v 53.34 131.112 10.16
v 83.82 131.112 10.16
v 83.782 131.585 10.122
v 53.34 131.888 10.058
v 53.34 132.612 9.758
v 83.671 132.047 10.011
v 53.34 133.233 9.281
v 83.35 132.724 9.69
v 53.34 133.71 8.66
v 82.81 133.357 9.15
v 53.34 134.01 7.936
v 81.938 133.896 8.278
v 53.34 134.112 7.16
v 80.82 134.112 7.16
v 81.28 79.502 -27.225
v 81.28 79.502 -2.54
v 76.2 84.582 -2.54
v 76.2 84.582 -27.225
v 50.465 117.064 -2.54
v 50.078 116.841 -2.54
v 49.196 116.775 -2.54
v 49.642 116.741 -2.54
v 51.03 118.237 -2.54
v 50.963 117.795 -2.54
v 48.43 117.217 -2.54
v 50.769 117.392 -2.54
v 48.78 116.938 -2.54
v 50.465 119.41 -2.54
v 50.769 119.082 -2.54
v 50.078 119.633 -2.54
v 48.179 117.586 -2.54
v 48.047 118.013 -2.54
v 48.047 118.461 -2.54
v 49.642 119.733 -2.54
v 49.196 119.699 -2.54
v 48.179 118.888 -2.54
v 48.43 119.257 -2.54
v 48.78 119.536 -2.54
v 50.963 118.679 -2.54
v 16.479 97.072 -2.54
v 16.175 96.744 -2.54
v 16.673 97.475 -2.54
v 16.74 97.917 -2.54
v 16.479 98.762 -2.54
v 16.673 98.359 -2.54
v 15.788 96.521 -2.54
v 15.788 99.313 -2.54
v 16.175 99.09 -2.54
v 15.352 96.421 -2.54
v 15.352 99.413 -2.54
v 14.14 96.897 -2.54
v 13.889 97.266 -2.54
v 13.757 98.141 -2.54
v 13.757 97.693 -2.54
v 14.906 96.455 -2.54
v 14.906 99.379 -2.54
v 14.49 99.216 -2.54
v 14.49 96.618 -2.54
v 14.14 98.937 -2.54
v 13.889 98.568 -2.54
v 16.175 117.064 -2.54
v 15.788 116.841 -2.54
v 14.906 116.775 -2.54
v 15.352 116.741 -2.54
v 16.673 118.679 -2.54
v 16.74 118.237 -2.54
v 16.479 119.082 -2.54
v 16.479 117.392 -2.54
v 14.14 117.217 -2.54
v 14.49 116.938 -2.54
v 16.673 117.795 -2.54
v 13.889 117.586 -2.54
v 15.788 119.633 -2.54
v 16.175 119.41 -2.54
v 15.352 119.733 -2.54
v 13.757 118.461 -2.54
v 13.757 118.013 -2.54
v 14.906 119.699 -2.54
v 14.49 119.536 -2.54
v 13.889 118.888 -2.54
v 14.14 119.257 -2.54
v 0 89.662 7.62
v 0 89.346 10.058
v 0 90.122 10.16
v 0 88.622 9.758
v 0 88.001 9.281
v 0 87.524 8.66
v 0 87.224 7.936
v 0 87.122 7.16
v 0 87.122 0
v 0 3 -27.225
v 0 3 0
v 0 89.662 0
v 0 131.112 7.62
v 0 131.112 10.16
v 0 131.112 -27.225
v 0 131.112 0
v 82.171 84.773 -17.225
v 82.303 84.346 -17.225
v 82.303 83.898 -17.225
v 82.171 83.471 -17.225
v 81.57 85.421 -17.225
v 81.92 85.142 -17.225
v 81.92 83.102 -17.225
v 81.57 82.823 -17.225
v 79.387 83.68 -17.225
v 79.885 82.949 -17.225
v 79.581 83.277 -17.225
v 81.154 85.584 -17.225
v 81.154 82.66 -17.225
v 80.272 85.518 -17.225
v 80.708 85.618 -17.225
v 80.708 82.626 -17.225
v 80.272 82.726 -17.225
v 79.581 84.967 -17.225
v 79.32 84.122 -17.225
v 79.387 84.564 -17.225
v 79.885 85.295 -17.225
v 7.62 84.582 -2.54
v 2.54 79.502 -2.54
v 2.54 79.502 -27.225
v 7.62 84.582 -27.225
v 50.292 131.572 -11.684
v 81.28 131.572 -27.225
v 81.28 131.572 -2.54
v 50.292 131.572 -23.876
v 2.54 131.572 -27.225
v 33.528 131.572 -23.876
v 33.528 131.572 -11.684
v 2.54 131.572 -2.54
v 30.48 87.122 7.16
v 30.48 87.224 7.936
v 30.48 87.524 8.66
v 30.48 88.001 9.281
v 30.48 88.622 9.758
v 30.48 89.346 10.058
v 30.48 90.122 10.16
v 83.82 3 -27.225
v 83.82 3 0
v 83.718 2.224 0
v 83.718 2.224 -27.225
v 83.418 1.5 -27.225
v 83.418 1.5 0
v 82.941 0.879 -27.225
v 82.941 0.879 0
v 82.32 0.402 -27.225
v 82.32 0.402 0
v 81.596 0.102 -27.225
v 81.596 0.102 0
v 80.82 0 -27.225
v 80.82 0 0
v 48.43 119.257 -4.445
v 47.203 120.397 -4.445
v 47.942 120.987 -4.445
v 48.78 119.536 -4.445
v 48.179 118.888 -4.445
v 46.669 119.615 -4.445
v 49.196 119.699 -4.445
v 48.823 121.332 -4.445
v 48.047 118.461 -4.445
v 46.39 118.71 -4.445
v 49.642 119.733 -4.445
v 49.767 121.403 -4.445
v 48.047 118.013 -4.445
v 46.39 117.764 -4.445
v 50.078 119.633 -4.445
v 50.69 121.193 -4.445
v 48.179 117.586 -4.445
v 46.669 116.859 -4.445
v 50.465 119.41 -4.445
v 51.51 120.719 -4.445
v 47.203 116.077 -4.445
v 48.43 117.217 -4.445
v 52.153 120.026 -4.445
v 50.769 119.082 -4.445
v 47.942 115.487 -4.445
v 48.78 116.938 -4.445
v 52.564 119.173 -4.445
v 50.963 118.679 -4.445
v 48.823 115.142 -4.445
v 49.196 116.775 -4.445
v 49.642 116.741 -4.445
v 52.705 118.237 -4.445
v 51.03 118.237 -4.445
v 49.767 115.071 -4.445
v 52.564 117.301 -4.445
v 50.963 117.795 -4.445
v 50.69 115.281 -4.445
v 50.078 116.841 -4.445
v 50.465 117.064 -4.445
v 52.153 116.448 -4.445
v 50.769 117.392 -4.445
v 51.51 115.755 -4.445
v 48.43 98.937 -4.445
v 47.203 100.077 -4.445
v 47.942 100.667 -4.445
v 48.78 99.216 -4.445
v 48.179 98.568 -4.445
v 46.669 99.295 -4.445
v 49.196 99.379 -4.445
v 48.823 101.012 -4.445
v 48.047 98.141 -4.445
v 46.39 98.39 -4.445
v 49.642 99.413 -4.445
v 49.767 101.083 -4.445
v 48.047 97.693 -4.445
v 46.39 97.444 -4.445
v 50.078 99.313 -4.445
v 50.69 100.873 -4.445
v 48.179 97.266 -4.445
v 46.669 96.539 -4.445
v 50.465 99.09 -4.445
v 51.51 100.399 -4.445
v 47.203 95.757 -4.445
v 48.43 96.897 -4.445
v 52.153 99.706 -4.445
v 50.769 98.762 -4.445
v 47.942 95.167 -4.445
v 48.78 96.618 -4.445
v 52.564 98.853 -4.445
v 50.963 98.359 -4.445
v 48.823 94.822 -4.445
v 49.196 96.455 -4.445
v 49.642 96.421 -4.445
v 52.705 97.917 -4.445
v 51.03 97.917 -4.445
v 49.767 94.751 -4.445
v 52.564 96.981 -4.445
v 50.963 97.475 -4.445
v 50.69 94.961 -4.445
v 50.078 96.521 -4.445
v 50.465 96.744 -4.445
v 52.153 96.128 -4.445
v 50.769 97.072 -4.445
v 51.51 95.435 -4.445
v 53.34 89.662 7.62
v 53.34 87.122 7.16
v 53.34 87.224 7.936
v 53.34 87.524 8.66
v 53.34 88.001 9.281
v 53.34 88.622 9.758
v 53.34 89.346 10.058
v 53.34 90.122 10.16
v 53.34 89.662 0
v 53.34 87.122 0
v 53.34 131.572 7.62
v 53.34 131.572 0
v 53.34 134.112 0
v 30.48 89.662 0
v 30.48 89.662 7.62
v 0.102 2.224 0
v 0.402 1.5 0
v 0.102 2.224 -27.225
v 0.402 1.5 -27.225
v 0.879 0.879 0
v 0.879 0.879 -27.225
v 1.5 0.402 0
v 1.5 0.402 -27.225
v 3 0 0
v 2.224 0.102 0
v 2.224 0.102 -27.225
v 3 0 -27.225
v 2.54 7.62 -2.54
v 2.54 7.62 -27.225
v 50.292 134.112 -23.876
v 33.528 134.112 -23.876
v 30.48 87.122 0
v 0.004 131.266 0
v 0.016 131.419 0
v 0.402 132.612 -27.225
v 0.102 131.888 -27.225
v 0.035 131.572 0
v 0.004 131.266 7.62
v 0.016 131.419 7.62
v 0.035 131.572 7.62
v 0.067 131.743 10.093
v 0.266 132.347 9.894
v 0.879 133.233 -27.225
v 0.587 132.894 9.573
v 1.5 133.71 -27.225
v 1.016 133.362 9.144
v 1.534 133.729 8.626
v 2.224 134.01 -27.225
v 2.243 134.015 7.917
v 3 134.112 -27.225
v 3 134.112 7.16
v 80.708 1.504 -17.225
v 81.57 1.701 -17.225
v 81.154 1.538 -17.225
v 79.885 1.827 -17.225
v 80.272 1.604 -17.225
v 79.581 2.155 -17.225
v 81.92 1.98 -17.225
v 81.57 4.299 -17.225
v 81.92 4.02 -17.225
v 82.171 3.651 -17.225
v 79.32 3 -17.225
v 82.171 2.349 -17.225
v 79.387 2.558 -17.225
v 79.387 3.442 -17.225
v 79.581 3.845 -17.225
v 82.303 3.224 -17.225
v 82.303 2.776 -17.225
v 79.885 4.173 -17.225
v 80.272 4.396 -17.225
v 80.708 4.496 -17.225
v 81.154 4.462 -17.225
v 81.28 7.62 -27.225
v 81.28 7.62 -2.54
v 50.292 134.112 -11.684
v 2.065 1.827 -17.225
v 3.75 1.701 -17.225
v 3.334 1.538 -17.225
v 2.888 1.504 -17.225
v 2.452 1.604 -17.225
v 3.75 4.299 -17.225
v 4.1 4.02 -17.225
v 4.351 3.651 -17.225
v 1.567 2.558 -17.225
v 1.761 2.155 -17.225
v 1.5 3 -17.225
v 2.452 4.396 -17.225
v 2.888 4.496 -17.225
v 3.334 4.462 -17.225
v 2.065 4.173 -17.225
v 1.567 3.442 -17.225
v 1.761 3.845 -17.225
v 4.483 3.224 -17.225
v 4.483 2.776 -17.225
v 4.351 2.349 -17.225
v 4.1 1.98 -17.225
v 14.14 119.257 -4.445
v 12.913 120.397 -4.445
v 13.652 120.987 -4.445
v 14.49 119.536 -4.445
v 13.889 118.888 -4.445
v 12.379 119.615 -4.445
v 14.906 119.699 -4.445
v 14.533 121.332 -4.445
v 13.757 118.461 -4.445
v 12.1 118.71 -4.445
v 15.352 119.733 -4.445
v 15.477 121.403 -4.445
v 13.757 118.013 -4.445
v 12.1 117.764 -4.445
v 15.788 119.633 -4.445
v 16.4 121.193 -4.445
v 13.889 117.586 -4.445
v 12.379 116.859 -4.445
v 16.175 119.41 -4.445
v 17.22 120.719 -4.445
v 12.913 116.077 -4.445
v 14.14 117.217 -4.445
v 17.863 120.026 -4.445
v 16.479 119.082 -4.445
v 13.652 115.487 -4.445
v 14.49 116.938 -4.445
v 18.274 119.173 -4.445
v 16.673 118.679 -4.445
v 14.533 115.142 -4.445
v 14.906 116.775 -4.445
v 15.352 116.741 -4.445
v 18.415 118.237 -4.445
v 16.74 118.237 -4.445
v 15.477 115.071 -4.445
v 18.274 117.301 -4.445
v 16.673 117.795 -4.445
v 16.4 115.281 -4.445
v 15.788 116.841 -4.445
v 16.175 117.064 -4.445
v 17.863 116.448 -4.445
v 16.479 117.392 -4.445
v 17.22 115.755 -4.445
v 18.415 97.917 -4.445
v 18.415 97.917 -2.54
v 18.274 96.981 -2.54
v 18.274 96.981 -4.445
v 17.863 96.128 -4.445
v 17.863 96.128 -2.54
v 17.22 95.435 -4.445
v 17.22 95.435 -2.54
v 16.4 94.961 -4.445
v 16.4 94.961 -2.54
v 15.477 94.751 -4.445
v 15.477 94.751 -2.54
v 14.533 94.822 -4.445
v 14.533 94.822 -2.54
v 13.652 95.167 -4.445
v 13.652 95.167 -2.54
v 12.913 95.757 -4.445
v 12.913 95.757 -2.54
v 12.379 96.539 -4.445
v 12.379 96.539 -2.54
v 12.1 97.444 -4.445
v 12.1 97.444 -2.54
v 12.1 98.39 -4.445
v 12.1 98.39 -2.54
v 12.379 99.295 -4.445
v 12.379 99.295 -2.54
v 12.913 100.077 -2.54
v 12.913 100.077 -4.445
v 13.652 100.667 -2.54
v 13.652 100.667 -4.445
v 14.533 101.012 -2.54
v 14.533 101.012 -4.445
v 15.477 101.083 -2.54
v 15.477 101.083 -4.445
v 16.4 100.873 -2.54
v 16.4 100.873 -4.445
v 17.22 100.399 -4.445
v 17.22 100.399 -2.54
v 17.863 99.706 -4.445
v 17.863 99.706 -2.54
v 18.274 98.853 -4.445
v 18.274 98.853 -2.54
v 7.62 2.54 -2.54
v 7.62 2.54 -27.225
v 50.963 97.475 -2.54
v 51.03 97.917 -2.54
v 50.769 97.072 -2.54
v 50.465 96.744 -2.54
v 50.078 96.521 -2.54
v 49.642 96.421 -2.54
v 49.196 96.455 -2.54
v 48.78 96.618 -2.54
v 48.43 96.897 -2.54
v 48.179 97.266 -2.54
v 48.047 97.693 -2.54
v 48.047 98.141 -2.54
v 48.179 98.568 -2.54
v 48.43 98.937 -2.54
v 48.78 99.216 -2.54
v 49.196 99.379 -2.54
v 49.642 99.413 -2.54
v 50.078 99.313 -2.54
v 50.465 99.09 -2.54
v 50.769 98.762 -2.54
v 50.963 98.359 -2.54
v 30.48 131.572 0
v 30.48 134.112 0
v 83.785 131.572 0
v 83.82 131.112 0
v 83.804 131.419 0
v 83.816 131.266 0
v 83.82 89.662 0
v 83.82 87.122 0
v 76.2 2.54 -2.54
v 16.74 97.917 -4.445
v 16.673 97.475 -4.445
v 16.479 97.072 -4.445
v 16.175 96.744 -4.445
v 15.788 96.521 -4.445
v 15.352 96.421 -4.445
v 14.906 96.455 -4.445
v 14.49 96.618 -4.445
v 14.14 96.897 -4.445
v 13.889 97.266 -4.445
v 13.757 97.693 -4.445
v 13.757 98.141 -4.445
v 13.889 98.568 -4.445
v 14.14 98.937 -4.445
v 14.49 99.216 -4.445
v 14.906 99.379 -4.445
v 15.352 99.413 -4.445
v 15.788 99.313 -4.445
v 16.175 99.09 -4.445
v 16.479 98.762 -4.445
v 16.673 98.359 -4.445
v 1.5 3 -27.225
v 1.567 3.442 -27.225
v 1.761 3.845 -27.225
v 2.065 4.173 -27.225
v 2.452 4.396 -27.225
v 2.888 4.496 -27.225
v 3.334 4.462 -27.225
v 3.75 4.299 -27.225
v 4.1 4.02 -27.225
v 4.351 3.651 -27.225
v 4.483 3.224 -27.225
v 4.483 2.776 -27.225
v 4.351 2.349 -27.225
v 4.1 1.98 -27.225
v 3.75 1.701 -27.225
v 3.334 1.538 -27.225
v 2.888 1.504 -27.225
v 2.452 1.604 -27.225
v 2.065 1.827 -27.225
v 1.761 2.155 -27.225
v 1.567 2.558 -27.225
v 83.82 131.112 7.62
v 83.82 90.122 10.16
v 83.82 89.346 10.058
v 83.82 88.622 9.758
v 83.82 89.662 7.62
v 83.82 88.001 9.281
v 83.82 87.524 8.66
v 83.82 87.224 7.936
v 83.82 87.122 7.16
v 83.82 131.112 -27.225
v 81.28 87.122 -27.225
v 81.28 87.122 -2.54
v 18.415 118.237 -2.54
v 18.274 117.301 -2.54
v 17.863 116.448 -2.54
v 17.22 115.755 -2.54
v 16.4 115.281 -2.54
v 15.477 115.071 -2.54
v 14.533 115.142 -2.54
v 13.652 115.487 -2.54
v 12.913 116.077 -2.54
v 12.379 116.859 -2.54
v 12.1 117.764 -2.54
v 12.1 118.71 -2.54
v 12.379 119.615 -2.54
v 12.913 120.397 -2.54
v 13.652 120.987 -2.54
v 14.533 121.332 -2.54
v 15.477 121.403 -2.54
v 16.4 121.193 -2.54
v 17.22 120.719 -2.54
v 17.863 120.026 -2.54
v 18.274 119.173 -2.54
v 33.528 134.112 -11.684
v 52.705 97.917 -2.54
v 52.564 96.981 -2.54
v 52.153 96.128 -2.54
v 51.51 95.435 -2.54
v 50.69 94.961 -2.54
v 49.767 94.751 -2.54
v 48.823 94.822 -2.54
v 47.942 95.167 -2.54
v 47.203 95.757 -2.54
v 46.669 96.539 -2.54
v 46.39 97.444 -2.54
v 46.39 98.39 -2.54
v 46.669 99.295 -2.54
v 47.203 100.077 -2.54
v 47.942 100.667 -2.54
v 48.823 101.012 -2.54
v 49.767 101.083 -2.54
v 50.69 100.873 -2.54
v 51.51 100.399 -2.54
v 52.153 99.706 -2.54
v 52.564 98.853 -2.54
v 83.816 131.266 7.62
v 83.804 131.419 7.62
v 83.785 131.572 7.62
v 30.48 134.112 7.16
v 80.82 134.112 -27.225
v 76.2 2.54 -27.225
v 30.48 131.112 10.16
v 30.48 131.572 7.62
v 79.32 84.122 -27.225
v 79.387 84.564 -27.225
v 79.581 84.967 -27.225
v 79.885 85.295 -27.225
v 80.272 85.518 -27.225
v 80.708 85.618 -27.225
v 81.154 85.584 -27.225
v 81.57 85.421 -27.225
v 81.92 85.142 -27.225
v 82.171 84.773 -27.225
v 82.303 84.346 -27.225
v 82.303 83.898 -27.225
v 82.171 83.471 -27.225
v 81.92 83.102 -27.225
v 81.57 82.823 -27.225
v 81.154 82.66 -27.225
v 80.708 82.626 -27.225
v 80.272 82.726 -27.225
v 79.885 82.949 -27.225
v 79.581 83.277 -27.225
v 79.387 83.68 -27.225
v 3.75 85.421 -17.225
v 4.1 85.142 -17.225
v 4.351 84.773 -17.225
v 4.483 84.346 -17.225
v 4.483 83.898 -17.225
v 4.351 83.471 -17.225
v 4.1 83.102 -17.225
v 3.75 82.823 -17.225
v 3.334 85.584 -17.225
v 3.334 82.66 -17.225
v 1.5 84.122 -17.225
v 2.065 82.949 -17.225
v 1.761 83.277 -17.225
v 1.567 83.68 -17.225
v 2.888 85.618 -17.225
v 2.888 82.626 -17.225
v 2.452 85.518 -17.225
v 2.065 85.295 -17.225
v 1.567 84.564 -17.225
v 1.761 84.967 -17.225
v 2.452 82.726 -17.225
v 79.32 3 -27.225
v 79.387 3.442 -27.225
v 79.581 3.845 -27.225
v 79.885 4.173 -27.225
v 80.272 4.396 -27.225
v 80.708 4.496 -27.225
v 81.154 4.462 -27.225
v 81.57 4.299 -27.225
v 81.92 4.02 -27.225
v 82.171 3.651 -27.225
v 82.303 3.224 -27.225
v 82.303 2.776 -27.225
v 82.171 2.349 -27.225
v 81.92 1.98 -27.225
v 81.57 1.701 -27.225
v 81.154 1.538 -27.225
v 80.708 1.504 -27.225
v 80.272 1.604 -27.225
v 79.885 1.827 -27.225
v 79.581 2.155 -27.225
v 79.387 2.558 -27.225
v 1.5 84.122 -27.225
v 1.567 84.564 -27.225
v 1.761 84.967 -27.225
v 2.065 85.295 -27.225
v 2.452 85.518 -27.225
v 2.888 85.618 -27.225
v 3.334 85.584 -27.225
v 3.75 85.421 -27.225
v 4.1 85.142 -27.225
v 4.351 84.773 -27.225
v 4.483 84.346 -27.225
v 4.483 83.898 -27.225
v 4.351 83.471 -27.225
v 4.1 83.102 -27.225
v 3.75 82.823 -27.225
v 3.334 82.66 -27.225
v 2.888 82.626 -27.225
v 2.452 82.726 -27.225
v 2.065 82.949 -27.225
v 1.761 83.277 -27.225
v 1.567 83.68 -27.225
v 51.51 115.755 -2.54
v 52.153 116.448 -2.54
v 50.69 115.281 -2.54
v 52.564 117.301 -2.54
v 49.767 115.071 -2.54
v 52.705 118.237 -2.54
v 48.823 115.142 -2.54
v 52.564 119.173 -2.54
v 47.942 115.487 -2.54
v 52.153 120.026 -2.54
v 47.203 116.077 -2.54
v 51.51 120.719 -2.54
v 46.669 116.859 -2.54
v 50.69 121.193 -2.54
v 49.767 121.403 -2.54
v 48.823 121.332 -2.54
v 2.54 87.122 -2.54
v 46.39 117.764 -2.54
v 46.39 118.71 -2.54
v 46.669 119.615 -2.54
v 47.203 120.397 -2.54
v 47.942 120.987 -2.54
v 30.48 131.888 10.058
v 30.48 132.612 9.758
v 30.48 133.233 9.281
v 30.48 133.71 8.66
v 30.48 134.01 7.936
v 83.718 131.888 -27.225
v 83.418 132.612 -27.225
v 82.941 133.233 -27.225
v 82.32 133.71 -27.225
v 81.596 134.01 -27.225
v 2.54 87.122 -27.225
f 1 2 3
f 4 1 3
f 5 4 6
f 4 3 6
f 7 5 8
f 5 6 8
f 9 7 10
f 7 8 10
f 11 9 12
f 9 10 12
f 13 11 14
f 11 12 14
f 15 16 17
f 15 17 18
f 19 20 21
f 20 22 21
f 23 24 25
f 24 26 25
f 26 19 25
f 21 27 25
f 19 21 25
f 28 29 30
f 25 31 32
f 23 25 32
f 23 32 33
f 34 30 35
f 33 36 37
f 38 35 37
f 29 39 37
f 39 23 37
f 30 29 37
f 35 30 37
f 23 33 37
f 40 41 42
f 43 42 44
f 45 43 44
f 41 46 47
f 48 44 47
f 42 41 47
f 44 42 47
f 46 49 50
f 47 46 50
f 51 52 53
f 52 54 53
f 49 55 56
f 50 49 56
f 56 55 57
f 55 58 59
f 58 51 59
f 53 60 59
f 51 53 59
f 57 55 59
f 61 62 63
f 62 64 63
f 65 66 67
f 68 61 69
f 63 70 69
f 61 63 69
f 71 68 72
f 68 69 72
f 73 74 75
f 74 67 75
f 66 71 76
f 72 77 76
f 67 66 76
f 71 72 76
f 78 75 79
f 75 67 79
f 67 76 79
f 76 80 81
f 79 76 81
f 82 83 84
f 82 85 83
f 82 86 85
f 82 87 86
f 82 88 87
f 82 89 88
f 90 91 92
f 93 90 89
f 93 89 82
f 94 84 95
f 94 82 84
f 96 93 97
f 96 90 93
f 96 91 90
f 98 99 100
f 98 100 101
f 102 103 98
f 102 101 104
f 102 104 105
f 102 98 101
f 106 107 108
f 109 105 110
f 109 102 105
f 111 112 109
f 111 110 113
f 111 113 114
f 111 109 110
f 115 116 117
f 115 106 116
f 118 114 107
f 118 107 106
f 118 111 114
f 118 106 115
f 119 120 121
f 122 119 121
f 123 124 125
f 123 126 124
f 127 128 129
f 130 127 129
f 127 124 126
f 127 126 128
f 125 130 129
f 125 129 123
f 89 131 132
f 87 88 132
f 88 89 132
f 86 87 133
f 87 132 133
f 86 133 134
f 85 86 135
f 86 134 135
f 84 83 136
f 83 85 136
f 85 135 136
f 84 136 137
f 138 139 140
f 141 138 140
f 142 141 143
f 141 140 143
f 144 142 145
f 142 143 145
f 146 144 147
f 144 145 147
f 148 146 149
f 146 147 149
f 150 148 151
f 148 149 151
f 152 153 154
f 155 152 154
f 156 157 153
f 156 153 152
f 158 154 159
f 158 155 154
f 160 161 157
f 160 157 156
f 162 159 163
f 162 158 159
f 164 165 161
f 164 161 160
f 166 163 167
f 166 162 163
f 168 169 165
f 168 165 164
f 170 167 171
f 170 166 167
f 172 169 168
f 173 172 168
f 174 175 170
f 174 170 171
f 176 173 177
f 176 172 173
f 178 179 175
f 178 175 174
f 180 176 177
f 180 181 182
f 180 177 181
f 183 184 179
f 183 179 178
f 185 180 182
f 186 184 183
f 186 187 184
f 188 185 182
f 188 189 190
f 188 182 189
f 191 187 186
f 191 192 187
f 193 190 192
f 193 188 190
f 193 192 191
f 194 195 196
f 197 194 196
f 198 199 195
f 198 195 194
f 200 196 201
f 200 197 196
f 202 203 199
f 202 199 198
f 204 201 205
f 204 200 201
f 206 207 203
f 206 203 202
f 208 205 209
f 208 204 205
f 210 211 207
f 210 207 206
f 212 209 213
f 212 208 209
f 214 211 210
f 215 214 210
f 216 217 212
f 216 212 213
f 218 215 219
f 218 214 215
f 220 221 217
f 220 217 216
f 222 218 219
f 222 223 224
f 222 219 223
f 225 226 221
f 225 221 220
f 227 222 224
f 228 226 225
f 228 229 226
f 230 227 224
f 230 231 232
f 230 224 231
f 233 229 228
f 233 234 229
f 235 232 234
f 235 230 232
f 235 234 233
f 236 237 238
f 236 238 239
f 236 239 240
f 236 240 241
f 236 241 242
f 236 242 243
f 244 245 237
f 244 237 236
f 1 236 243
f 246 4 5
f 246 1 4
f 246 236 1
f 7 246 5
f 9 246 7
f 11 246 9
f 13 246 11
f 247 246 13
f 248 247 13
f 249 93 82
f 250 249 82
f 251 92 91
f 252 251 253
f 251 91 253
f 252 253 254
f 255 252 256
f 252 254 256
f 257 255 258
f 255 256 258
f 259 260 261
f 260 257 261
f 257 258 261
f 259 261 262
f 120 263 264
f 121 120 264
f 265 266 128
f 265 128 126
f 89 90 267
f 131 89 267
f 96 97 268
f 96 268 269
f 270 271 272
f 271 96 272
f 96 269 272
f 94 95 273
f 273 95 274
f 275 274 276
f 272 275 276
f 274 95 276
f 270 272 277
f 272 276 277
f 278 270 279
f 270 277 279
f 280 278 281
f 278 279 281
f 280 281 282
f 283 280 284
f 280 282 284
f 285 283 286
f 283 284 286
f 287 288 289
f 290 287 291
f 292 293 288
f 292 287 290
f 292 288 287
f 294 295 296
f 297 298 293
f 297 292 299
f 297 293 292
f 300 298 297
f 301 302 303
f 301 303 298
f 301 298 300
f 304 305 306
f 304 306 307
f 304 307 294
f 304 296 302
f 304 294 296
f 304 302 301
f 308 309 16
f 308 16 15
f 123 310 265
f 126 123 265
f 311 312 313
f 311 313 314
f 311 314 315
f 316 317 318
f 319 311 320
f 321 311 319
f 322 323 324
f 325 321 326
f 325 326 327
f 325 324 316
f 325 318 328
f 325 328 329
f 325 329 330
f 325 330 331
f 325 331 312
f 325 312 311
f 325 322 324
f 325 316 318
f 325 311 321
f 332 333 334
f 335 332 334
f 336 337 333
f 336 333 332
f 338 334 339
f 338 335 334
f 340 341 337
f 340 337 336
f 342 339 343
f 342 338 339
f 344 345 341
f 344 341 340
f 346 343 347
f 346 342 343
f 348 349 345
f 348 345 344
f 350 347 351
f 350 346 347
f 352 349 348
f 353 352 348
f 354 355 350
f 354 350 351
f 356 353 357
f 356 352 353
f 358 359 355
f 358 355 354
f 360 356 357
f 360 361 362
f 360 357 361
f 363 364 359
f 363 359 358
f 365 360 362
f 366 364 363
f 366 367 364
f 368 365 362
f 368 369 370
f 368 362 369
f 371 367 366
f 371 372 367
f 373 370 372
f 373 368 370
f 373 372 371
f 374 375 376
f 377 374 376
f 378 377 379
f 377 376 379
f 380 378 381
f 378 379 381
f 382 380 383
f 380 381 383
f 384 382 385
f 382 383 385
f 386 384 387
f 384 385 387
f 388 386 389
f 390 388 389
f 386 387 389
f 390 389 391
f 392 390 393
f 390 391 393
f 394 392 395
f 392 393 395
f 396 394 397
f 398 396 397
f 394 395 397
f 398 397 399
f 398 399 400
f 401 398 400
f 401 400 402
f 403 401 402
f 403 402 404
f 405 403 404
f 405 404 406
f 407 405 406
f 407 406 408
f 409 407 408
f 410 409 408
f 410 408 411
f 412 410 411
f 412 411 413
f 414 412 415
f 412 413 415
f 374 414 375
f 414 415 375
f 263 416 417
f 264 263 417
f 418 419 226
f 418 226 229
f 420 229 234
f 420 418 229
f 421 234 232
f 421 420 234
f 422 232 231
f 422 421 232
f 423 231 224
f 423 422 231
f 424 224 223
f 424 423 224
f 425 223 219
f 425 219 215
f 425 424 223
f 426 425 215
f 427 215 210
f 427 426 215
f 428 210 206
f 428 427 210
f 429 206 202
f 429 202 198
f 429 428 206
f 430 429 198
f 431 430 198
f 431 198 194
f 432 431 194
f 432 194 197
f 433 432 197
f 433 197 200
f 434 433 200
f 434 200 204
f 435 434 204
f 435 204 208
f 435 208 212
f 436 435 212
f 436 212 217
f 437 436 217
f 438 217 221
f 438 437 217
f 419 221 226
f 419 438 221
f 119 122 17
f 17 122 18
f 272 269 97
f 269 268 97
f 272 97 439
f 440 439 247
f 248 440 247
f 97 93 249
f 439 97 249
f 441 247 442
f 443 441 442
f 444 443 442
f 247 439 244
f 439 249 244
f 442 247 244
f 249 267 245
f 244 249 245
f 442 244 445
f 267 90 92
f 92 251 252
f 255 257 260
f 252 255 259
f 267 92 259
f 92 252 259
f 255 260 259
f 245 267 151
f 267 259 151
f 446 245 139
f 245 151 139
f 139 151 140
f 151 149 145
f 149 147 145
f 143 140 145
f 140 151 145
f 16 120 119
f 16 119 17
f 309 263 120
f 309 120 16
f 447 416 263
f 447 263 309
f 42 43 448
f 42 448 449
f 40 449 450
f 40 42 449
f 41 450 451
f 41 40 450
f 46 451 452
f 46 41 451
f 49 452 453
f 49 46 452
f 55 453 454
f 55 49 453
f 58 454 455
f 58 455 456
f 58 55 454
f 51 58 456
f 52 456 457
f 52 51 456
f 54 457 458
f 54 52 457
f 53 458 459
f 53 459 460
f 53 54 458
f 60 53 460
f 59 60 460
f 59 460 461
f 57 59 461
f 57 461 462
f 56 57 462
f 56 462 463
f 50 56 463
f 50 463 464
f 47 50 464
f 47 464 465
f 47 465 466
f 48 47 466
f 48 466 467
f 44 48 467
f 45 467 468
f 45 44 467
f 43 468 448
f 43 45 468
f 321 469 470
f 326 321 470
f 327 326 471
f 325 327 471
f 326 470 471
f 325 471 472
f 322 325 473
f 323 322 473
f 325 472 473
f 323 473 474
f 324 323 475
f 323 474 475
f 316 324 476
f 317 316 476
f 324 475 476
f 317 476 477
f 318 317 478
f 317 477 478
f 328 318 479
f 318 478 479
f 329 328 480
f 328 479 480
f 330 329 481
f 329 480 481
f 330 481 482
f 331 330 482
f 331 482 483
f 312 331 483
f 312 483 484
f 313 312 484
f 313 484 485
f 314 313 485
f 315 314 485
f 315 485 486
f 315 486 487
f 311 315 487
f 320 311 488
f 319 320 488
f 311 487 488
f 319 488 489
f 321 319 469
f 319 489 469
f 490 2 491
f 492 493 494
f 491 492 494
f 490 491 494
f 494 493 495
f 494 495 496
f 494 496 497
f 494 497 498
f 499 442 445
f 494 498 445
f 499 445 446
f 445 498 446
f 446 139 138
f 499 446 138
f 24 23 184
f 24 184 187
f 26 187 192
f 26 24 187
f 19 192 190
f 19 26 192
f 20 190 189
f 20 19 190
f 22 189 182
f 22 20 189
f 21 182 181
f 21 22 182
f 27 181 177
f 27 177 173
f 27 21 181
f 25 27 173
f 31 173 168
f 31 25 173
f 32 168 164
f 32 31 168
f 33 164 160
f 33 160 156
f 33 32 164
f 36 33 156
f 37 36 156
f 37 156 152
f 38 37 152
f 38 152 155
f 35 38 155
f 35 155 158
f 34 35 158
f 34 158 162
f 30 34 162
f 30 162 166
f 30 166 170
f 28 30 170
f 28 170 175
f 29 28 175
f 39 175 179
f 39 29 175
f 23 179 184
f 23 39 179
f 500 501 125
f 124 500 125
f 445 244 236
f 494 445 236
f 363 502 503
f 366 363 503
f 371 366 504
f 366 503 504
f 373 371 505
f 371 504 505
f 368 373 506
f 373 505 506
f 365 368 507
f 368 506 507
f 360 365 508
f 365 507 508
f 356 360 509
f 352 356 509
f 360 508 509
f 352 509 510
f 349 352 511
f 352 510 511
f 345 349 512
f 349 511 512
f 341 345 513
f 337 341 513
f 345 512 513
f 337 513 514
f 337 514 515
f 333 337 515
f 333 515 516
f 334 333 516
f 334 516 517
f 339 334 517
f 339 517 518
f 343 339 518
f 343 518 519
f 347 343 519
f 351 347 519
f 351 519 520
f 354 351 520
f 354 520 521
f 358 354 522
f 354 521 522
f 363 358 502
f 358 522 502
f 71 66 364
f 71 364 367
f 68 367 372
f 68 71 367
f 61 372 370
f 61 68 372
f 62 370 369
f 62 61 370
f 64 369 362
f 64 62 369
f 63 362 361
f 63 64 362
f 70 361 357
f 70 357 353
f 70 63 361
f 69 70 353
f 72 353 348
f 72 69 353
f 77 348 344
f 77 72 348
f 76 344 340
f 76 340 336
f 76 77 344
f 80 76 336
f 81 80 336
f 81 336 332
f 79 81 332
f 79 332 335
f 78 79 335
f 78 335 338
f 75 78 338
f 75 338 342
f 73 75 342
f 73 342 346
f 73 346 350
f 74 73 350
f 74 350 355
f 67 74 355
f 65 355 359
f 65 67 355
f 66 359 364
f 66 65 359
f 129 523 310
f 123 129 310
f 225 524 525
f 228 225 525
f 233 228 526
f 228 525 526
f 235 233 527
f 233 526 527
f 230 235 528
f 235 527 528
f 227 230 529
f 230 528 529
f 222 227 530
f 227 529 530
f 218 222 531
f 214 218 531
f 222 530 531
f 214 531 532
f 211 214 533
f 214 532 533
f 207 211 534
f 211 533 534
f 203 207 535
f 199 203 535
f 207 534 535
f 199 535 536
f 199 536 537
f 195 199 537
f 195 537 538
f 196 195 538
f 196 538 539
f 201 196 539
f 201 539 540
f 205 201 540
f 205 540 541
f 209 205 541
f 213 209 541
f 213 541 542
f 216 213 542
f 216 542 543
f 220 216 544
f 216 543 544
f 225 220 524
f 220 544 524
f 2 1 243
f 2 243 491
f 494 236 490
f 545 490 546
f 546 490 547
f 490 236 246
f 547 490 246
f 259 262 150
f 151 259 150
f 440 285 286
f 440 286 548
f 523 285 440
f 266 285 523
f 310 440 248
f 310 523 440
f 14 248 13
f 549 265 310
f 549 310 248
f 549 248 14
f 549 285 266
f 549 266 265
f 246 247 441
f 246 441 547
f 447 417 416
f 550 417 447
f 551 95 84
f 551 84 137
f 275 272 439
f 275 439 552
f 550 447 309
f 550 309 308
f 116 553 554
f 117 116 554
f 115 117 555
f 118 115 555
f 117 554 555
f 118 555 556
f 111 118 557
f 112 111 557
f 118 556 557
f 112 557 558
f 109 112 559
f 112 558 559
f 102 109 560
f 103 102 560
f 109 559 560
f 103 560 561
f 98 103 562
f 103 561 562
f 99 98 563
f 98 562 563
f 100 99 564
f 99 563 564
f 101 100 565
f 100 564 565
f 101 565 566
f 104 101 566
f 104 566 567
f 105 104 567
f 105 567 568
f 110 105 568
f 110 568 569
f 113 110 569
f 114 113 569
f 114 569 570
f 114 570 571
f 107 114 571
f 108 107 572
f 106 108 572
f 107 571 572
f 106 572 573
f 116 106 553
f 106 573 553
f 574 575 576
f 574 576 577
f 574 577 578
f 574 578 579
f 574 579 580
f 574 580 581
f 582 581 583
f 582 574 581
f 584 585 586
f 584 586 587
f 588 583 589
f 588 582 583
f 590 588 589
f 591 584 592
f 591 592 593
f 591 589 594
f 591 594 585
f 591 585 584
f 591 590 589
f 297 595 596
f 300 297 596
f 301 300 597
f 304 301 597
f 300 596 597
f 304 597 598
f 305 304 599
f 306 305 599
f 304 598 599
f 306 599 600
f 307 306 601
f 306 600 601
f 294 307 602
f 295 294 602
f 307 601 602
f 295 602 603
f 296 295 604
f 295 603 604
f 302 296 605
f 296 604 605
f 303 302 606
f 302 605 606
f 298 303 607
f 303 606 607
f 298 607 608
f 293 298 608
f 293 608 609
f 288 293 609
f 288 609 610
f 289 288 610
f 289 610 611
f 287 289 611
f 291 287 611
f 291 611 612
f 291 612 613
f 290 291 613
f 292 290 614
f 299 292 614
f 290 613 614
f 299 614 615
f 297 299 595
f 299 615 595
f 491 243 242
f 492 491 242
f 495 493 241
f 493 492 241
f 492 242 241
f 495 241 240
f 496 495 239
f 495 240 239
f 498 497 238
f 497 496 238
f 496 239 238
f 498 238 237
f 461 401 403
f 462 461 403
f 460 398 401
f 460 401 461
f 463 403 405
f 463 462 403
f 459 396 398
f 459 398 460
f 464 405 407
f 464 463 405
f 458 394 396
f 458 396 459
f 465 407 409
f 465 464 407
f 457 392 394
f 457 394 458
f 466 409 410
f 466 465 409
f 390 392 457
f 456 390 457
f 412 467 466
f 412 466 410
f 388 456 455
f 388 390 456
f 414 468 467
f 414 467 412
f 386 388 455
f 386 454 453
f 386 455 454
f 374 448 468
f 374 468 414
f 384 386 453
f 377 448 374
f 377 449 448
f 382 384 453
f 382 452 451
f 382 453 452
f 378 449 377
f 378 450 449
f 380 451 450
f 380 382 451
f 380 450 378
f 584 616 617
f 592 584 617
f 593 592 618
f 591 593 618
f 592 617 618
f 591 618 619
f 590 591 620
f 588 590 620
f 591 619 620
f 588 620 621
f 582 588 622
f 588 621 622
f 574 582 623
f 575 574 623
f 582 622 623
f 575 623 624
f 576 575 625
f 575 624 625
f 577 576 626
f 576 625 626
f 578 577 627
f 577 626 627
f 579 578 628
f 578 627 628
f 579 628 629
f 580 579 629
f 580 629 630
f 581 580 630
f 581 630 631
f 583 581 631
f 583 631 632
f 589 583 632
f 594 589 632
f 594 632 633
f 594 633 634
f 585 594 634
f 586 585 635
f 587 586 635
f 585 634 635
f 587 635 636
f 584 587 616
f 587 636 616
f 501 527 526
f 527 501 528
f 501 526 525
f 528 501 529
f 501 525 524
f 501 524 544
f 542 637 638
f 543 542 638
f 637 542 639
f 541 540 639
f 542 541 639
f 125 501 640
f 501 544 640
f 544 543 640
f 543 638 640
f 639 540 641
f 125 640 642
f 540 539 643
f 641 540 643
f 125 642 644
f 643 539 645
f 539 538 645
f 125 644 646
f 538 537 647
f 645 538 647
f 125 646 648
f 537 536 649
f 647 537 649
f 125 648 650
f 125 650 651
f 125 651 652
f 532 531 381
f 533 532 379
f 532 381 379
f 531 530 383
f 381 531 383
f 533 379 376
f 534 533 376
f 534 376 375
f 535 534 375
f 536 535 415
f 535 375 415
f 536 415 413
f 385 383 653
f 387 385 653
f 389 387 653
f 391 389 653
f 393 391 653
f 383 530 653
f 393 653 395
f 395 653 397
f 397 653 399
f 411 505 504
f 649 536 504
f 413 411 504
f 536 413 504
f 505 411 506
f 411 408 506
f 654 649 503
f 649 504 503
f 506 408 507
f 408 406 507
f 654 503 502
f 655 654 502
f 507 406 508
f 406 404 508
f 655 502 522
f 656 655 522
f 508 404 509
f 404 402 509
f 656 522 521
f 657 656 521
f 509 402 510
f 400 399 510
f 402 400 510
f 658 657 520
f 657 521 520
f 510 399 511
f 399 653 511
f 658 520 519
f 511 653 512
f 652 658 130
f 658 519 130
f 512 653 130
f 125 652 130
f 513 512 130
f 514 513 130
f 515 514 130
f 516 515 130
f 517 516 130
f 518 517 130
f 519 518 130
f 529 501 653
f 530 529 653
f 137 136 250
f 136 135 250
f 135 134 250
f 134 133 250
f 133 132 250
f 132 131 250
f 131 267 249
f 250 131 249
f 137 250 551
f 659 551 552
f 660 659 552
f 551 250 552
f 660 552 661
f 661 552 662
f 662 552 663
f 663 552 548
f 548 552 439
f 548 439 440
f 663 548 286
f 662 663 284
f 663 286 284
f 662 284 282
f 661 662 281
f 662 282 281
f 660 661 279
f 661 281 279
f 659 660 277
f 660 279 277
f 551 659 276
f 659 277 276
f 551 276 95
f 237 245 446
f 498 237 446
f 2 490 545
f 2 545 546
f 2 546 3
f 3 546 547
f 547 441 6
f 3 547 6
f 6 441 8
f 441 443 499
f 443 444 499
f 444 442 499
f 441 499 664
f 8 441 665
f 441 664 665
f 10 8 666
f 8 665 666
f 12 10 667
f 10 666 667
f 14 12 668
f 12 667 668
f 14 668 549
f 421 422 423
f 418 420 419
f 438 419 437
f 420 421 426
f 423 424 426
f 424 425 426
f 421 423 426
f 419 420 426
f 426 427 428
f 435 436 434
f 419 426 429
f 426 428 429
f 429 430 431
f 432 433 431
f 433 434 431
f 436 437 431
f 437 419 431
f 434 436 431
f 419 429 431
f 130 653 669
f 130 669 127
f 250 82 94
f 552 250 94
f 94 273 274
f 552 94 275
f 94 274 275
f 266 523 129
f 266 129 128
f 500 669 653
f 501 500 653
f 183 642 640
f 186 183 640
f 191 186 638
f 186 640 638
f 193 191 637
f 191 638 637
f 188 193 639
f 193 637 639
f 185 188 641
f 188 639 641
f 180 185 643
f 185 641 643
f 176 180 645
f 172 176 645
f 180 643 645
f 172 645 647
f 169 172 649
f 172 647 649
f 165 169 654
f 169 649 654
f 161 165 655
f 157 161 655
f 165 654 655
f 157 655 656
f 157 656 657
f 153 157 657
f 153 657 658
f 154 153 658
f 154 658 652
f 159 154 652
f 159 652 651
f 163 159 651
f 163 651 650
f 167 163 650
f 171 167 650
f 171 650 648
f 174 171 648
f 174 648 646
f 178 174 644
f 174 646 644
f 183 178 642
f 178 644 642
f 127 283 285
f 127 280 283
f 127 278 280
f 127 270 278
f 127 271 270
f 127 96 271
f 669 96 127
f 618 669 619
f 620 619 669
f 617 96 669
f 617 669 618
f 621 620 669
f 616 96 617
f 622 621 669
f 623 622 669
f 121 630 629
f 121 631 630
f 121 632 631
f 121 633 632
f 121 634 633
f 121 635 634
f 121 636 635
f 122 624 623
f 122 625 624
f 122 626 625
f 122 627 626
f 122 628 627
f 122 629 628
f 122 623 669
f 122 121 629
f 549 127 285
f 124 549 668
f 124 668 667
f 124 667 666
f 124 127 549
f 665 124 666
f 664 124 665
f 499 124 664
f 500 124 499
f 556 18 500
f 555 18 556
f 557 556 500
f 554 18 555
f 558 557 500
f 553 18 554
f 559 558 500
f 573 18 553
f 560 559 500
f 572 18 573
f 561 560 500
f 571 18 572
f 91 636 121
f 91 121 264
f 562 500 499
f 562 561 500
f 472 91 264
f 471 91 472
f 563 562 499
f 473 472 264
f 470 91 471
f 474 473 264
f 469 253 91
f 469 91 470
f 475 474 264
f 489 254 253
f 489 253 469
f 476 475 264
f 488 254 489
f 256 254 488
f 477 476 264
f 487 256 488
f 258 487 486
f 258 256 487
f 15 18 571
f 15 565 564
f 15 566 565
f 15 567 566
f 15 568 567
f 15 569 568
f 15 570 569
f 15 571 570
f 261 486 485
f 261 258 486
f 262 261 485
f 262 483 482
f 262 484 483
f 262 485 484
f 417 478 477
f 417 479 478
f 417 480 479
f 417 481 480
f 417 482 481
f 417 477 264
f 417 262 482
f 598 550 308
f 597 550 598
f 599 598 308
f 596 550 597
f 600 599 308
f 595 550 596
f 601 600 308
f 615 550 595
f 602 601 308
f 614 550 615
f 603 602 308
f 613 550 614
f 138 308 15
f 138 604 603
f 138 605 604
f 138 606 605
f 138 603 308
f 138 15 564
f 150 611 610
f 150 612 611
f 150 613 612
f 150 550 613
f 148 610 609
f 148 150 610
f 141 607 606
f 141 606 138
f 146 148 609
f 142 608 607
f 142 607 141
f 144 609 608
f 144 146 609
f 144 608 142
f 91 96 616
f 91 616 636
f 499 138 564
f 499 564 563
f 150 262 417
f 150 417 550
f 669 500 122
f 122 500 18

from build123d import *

# Parameters (mm, degrees)
SKETCH1_W           = 83.82
SKETCH1_H           = 27.225
BOSS_EXTRUDE1_DEPTH = 87.122
SHELL1_T            = -2.54
SKETCH12_W          = 83.82
SKETCH12_H          = 27.225
BOSS_EXTRUDE6_DEPTH = 46.99
SHELL2_START        = 2.54
SHELL2_OUTLINE_W    = 44.45
SHELL2_OUTLINE_H    = 24.685
SHELL2_DEPTH        = 78.74
SKETCH5_R           = 3.175
SKETCH5_R_2         = 1.5
BOSS_EXTRUDE7_DEPTH = 1.905
CUT_EXTRUDE10_REACH = 162.477
SKETCH14_W          = 16.764
SKETCH14_H          = 12.192
SKETCH15_W          = 30.48
SKETCH15_H          = 46.99
BOSS_EXTRUDE8_DEPTH = 10.16
SKETCH16_W          = 7.62
SKETCH16_H          = 41.91
CUT_EXTRUDE11_DEPTH = 161.477479943
CHAMFER1_SIZE       = 5.08
SKETCH17_R          = 1.5
CUT_EXTRUDE12_DEPTH = 10
FILLET1_R           = 3


# Read off the part's stored shape, not the designer's step: Shell2
with BuildPart() as part:
    # Sketch1 → Boss-Extrude1 (new body)
    with BuildSketch(Plane(origin=(0, 0, 0), x_dir=(1, 0, 0), z_dir=(0, 1, 0))):
        with Locations((41.91, 13.6125)):
            Rectangle(SKETCH1_W, SKETCH1_H)
    extrude(amount=BOSS_EXTRUDE1_DEPTH)

    # Shell1
    shell1_openings = [part.faces().sort_by_distance(p)[0] for p in [
        (41.91, 43.561, -27.225),
    ]]
    offset(amount=SHELL1_T, openings=shell1_openings, kind=Kind.INTERSECTION)

    # Sketch12 → Boss-Extrude6 (add)
    with BuildSketch(Plane(origin=(0, 87.122, 0), x_dir=(1, 0, 0), z_dir=(0, 1, 0))):
        with Locations((41.91, 13.6125)):
            Rectangle(SKETCH12_W, SKETCH12_H)
    extrude(amount=BOSS_EXTRUDE6_DEPTH)

    # Shell2 outline → Shell2 (cut)
    with BuildSketch(Plane.YZ.offset(SHELL2_START)):
        with Locations((109.347, -14.8825)):
            Rectangle(SHELL2_OUTLINE_W, SHELL2_OUTLINE_H)
    extrude(amount=SHELL2_DEPTH, mode=Mode.SUBTRACT)

    # Sketch5 → Boss-Extrude7 (add)
    # profile 1 of 4: a face of its own
    with BuildSketch(Plane(origin=(0, 88.392, -2.54), x_dir=(1, 0, 0), z_dir=(0, 0, -1))):
        with Locations((15.24, -29.845)):
            Circle(SKETCH5_R)
        with Locations((15.24, -29.845)):
            Circle(SKETCH5_R_2, mode=Mode.SUBTRACT)
    # profile 2 of 4: a face of its own
    with BuildSketch(Plane(origin=(0, 88.392, -2.54), x_dir=(1, 0, 0), z_dir=(0, 0, -1))):
        with Locations((15.24, -9.525)):
            Circle(SKETCH5_R)
        with Locations((15.24, -9.525)):
            Circle(SKETCH5_R_2, mode=Mode.SUBTRACT)
    # profile 3 of 4: a face of its own
    with BuildSketch(Plane(origin=(0, 88.392, -2.54), x_dir=(1, 0, 0), z_dir=(0, 0, -1))):
        with Locations((49.53, -9.525)):
            Circle(SKETCH5_R)
        with Locations((49.53, -9.525)):
            Circle(SKETCH5_R_2, mode=Mode.SUBTRACT)
    # profile 4 of 4: a face of its own
    with BuildSketch(Plane(origin=(0, 88.392, -2.54), x_dir=(1, 0, 0), z_dir=(0, 0, -1))):
        with Locations((49.53, -29.845)):
            Circle(SKETCH5_R)
        with Locations((49.53, -29.845)):
            Circle(SKETCH5_R_2, mode=Mode.SUBTRACT)
    extrude(amount=BOSS_EXTRUDE7_DEPTH)

    # Sketch14 → Cut-Extrude10 (cut, up to next)
    with BuildSketch(Plane(origin=(0, 134.112, 0), x_dir=(1, 0, 0), z_dir=(0, 1, 0)), mode=Mode.PRIVATE) as cut_extrude10_sk1:
        with Locations((41.91, 17.78)):
            Rectangle(SKETCH14_W, SKETCH14_H)
    cut_extrude10_tool1 = extrude(cut_extrude10_sk1.sketch, amount=-CUT_EXTRUDE10_REACH, mode=Mode.PRIVATE) & part.part
    add(cut_extrude10_tool1.solids().sort_by_distance((41.91, 134.112, -17.78))[0], mode=Mode.SUBTRACT)

    # Sketch15 → Boss-Extrude8 (add)
    with BuildSketch(Plane.XY):
        with Locations((15.24, 110.617)):
            Rectangle(SKETCH15_W, SKETCH15_H)
        with Locations((68.58, 110.617)):
            Rectangle(SKETCH15_W, SKETCH15_H)
    extrude(amount=BOSS_EXTRUDE8_DEPTH)

    # Sketch16 → Cut-Extrude11 (cut, through all)
    with BuildSketch(Plane.ZY):
        with Locations((3.81, 110.617)):
            Rectangle(SKETCH16_W, SKETCH16_H)
    extrude(amount=-CUT_EXTRUDE11_DEPTH, mode=Mode.SUBTRACT)

    # Chamfer1
    chamfer1_edges = [part.edges().sort_by_distance(p)[0] for p in [
        (2.54, 2.54, -14.8825),
        (81.28, 2.54, -14.8825),
        (2.54, 84.582, -14.8825),
        (81.28, 84.582, -14.8825),
    ]]
    chamfer(chamfer1_edges, length=CHAMFER1_SIZE)

    # Sketch17 → Cut-Extrude12 (cut)
    with BuildSketch(Plane(origin=(0, 0, -27.225), x_dir=(-1, 0, 0), z_dir=(0, 0, -1))):
        with Locations((-3, 84.122)):
            Circle(SKETCH17_R)
        with Locations((-80.82, 84.122)):
            Circle(SKETCH17_R)
        with Locations((-80.82, 3)):
            Circle(SKETCH17_R)
        with Locations((-3, 3)):
            Circle(SKETCH17_R)
    extrude(amount=-CUT_EXTRUDE12_DEPTH, mode=Mode.SUBTRACT)

    # Fillet1
    # the kernel refuses this fillet: 3 mm, written as the material it takes off along each edge
    with BuildSketch(Plane(origin=(91.32, 134.112, 10.16), x_dir=(0, 0, -1), z_dir=(-1, 0, 0)), Plane(origin=(45.84, 87.122, 10.16), x_dir=(0, 0, -1), z_dir=(1, 0, 0)), Plane(origin=(37.98, 87.122, 10.16), x_dir=(0, 1, 0), z_dir=(-1, 0, 0))) as fillet1_piece_1:
        with BuildLine():
            CenterArc((FILLET1_R, FILLET1_R), FILLET1_R, 180, 90)
            Line((0, FILLET1_R), (0, 0))
            Line((0, 0), (FILLET1_R, 0))
        make_face()
    extrude(amount=45.48, mode=Mode.SUBTRACT)
    with BuildSketch(Plane(origin=(-7.5, 134.112, 10.16), x_dir=(0, 0, -1), z_dir=(1, 0, 0))) as fillet1_piece_2:
        with BuildLine():
            CenterArc((FILLET1_R, -FILLET1_R), FILLET1_R, 90, 90)
            Line((0, -FILLET1_R), (0, 0))
            Line((0, 0), (FILLET1_R, 0))
        make_face()
    extrude(amount=45.48, mode=Mode.SUBTRACT)
    with BuildSketch(Plane(origin=(83.82, 134.112, -34.725), x_dir=(0, -1, 0), z_dir=(0, 0, 1))) as fillet1_piece_3:
        with BuildLine():
            CenterArc((FILLET1_R, -FILLET1_R), FILLET1_R, 90, 90)
            Line((0, -FILLET1_R), (0, 0))
            Line((0, 0), (FILLET1_R, 0))
        make_face()
    extrude(amount=52.385, mode=Mode.SUBTRACT)
    with BuildSketch(Plane(origin=(83.82, 0, 7.5), x_dir=(0, 1, 0), z_dir=(0, 0, -1))) as fillet1_piece_4:
        with BuildLine():
            CenterArc((FILLET1_R, -FILLET1_R), FILLET1_R, 90, 90)
            Line((0, -FILLET1_R), (0, 0))
            Line((0, 0), (FILLET1_R, 0))
        make_face()
    extrude(amount=42.225, mode=Mode.SUBTRACT)
    with BuildSketch(Plane(origin=(0, 0, -34.725), x_dir=(1, 0, 0), z_dir=(0, 0, 1))) as fillet1_piece_5:
        with BuildLine():
            CenterArc((FILLET1_R, FILLET1_R), FILLET1_R, 180, 90)
            Line((0, FILLET1_R), (0, 0))
            Line((0, 0), (FILLET1_R, 0))
        make_face()
    extrude(amount=42.225, mode=Mode.SUBTRACT)
    with BuildSketch(Plane(origin=(0, 134.112, 17.66), x_dir=(1, 0, 0), z_dir=(0, 0, -1))) as fillet1_piece_6:
        with BuildLine():
            CenterArc((FILLET1_R, FILLET1_R), FILLET1_R, 180, 90)
            Line((0, FILLET1_R), (0, 0))
            Line((0, 0), (FILLET1_R, 0))
        make_face()
    extrude(amount=52.385, mode=Mode.SUBTRACT)


solid = part.part
